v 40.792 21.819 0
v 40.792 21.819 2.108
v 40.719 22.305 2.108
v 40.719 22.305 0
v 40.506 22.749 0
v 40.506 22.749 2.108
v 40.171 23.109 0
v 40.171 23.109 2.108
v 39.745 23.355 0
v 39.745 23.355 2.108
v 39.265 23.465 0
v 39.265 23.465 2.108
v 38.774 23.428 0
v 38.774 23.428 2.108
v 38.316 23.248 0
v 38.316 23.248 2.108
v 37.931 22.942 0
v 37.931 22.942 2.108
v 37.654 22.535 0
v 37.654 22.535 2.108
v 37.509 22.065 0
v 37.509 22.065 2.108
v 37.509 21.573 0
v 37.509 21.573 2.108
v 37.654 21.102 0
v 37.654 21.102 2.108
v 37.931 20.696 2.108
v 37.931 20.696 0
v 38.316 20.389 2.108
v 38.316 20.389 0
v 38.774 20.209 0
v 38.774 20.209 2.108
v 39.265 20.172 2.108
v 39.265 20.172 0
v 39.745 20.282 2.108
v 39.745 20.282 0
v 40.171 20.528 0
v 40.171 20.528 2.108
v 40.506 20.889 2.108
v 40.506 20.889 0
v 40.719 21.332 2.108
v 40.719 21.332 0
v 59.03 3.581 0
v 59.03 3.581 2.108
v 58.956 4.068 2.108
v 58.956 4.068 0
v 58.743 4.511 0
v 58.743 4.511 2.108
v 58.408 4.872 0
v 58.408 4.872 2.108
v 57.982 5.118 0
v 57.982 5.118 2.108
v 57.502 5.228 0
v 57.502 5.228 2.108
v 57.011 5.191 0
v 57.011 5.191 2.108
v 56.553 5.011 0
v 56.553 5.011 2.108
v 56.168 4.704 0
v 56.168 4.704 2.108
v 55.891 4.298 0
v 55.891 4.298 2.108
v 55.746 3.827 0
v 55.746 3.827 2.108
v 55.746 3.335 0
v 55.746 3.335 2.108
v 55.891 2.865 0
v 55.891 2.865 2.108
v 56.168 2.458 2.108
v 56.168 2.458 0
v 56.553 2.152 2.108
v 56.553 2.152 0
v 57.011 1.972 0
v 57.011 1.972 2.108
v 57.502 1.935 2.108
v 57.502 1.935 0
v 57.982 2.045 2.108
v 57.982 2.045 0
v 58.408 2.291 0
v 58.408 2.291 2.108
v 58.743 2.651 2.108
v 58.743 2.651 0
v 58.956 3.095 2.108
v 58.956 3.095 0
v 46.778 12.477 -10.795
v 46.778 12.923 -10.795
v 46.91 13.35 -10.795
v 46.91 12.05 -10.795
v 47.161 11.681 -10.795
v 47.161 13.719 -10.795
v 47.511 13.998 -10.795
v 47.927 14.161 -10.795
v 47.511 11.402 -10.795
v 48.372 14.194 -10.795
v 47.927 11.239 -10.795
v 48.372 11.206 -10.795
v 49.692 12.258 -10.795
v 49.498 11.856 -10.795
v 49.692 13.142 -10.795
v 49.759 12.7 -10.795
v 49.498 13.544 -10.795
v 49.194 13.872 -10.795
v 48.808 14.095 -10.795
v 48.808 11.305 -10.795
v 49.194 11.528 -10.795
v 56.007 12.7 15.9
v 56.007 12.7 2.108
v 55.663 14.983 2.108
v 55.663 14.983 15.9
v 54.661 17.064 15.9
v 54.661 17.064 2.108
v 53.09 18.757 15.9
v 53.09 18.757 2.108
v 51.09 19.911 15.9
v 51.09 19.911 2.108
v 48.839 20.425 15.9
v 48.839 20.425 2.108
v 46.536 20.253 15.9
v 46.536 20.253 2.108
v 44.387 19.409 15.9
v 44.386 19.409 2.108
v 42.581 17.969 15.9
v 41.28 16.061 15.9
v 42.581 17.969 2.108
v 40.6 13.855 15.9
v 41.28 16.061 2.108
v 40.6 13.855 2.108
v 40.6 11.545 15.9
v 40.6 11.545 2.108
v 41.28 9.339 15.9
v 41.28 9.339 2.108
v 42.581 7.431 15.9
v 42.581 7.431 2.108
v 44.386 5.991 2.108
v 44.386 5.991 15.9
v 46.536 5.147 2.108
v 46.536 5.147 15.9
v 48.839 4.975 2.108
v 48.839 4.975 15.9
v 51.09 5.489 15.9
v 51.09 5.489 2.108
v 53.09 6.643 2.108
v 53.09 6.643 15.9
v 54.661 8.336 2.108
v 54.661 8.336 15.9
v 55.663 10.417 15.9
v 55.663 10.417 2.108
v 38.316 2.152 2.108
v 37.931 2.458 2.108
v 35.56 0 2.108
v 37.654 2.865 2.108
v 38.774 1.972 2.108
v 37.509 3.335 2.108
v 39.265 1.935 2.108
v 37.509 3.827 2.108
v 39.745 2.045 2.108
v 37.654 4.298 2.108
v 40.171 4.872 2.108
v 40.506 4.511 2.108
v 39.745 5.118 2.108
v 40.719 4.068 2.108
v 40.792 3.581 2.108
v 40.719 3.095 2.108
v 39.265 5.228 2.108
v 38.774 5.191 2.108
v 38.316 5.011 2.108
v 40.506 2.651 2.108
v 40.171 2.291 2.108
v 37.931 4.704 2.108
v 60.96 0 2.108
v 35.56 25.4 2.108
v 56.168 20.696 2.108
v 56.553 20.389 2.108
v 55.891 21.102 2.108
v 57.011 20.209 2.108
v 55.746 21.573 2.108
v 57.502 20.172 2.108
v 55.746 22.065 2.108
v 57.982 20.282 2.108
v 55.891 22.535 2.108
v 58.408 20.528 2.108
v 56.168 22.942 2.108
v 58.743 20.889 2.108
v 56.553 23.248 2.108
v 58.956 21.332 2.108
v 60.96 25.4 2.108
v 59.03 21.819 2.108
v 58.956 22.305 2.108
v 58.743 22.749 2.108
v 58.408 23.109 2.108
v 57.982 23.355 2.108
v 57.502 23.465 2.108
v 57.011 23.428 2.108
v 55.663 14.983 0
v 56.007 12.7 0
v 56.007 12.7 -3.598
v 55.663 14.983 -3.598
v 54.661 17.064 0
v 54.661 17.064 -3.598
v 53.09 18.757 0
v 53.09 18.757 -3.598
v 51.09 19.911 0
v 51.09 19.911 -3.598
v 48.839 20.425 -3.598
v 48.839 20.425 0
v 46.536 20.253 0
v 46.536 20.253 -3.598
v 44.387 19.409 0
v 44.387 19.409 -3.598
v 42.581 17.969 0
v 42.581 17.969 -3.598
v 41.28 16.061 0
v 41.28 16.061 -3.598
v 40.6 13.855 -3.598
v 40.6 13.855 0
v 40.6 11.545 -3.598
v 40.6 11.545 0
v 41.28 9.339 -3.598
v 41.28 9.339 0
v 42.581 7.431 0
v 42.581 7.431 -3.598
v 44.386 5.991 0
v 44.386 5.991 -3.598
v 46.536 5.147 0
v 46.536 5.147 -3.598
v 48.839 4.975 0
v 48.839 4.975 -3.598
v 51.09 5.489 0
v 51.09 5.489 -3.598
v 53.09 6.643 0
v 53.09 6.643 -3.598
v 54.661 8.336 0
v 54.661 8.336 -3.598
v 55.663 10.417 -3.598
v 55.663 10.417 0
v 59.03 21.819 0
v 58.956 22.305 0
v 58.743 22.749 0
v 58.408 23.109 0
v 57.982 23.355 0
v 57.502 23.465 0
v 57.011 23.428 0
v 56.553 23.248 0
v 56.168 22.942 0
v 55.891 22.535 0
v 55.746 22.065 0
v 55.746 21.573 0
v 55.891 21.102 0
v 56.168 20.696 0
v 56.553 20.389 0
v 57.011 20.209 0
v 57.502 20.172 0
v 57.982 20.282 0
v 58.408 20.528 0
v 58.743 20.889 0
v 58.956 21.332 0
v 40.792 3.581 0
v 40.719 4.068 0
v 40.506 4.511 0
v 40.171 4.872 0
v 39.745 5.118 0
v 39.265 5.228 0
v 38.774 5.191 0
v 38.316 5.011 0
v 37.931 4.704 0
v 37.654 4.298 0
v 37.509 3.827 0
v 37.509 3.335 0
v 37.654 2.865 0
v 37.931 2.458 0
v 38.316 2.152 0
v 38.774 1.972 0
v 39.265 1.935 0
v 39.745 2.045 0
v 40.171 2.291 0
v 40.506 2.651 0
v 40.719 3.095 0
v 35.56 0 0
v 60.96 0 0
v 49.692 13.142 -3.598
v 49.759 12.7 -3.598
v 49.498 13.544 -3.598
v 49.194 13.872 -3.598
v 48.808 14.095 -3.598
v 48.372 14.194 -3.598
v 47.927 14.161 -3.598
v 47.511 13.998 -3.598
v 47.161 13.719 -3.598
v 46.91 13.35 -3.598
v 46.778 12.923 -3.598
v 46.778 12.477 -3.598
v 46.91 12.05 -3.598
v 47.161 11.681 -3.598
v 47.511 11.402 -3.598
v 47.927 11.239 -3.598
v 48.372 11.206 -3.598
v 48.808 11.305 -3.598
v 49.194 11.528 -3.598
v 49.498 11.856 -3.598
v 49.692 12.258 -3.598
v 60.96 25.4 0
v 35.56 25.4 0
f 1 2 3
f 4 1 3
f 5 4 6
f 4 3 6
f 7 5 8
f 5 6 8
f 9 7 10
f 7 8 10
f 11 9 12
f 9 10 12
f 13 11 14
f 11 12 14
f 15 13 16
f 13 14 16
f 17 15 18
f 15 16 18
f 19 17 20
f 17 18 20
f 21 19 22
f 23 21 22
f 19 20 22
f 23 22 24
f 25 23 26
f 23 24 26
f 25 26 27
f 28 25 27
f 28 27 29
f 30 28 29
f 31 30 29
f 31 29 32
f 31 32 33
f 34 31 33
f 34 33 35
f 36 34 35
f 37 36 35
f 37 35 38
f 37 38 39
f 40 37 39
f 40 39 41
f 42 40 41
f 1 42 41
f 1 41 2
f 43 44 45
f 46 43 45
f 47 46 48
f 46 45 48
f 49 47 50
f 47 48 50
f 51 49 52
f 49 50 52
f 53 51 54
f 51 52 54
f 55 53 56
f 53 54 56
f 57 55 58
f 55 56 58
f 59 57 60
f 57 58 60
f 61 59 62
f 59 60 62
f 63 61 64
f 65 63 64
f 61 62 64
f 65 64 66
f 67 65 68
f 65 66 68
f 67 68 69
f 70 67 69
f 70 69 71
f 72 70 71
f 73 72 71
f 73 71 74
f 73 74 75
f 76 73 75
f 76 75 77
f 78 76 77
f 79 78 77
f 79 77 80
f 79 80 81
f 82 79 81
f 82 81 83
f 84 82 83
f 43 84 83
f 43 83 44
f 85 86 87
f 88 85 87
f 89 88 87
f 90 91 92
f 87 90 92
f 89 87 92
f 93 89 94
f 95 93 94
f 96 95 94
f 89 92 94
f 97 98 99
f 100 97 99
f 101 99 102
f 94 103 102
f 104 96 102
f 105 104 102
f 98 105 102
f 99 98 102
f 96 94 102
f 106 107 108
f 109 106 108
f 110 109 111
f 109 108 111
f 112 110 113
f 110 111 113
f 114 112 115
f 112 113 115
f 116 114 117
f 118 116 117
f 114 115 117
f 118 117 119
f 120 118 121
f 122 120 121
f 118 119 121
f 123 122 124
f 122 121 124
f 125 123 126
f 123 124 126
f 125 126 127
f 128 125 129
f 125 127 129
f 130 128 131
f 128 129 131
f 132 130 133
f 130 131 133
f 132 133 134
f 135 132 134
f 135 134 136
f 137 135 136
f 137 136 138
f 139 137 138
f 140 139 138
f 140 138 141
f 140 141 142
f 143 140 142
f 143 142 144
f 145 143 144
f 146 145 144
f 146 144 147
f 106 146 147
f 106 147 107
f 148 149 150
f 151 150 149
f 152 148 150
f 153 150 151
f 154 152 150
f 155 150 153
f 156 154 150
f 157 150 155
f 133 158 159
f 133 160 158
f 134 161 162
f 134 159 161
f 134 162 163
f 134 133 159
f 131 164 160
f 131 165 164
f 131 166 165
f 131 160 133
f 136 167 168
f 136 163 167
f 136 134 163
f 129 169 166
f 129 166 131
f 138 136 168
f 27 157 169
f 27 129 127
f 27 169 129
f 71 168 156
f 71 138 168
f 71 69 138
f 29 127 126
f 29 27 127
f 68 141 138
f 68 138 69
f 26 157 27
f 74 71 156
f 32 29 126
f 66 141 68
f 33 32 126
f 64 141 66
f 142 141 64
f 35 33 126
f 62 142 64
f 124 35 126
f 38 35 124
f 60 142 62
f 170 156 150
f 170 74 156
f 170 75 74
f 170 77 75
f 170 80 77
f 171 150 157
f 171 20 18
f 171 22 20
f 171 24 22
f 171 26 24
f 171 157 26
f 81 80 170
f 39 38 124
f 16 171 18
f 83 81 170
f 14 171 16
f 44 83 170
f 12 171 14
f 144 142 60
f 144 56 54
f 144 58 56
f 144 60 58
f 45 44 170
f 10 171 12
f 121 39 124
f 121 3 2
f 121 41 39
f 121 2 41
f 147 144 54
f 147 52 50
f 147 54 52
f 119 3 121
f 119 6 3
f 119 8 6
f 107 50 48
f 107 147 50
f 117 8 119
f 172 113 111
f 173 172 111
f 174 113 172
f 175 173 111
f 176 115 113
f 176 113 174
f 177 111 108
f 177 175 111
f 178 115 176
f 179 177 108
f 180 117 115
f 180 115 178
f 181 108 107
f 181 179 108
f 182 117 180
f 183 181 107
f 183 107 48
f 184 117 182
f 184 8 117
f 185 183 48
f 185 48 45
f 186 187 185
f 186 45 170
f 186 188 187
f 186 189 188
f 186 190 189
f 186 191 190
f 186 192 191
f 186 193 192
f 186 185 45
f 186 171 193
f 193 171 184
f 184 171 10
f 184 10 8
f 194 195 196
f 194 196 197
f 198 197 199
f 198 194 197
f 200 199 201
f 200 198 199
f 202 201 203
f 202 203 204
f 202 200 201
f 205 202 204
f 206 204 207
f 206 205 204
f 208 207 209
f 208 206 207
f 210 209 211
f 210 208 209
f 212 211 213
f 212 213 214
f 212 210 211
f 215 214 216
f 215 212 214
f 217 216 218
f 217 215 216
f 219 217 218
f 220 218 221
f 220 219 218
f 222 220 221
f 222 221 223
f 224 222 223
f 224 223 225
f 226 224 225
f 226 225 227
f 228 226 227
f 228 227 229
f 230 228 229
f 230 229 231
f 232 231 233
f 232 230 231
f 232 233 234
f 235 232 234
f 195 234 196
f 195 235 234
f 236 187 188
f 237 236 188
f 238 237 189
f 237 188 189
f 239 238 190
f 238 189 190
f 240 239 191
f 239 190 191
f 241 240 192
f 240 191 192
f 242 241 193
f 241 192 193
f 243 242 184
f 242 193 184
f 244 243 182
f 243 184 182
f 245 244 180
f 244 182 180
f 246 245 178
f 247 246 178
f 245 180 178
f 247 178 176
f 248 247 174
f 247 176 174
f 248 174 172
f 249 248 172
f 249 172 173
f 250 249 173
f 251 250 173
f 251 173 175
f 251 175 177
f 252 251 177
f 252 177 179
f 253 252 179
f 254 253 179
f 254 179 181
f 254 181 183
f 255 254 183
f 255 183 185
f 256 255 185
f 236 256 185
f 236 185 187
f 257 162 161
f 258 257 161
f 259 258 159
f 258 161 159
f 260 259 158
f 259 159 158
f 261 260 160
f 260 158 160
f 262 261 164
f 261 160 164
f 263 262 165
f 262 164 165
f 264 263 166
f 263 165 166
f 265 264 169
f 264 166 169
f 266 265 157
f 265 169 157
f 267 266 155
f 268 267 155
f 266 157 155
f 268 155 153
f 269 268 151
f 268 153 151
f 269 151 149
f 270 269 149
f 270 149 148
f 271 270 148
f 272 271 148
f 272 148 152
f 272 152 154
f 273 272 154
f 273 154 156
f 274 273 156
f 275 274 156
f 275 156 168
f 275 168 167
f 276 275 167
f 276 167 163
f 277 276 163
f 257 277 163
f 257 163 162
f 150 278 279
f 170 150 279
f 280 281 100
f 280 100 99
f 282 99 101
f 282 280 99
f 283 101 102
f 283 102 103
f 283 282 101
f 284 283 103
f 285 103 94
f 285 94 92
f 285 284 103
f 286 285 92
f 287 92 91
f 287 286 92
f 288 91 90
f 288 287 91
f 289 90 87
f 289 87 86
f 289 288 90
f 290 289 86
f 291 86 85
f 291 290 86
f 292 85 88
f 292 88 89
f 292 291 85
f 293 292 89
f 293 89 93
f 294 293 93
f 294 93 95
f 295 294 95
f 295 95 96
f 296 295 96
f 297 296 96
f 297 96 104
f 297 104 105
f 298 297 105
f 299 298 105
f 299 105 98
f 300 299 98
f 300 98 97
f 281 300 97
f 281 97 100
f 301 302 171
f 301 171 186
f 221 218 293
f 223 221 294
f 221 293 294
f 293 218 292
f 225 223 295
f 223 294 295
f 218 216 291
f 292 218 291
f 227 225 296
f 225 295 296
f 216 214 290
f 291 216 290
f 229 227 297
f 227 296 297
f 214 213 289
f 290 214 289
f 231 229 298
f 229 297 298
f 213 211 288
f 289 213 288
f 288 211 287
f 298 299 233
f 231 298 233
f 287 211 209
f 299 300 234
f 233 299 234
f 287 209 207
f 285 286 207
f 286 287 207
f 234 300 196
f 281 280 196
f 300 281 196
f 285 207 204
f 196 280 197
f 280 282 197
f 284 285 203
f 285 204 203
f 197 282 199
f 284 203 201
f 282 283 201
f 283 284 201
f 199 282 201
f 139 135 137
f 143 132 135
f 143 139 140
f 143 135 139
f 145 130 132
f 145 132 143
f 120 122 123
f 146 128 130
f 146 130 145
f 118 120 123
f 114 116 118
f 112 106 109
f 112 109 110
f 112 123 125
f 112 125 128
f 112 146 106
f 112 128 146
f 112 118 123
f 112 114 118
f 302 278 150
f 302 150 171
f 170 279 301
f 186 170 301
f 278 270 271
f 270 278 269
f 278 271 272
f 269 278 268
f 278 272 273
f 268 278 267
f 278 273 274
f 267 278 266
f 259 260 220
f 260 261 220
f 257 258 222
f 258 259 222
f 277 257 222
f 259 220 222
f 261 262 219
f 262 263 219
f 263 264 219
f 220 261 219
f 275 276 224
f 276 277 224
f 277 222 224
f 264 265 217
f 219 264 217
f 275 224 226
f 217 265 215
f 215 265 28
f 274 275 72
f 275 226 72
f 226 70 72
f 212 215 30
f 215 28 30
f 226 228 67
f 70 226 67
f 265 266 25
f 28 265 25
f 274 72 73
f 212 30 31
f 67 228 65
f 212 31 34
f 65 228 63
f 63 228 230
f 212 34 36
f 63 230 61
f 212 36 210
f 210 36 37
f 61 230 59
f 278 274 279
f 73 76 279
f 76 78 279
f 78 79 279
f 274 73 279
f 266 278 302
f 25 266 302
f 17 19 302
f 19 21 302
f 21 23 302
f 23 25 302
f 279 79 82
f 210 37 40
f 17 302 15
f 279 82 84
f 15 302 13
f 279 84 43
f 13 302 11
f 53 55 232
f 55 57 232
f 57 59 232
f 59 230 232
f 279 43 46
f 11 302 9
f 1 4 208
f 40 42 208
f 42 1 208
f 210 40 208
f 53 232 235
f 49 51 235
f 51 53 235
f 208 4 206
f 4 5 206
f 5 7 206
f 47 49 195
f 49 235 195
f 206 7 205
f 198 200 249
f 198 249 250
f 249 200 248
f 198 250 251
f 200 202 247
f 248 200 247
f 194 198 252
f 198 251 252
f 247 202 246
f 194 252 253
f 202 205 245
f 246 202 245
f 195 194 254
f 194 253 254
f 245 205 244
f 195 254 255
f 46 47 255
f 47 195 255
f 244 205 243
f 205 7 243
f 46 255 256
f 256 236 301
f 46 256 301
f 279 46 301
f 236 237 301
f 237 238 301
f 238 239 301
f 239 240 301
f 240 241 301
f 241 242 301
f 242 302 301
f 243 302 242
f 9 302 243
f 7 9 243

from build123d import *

# Parameters (mm, degrees)
SKETCH003_W  = 25.4
SKETCH003_H  = 25.4
PAD003_DEPTH = 2.1082
SKETCH004_R  = 1.651
POCKET_DEPTH = 2.1092
SKETCH005_R  = 7.747
PAD004_DEPTH = 15.9004
SKETCH006_R  = 7.747
PAD005_DEPTH = 3.598333
SKETCH007_R  = 1.4986
PAD006_DEPTH = 10.795


with BuildPart() as part:
    # Sketch003 → Pad003 (new body)
    with BuildSketch(Plane.XY):
        with Locations((12.7, 12.7)):
            Rectangle(SKETCH003_W, SKETCH003_H)
    extrude(amount=PAD003_DEPTH)

    # Sketch004 (on Face6 of Pad003) → Pocket (cut, through all)
    with BuildSketch(Plane.XY.offset(2.1082)):
        with Locations((3.5814, 21.8186)):
            Circle(SKETCH004_R)
        with Locations((21.8186, 21.8186)):
            Circle(SKETCH004_R)
        with Locations((21.8186, 3.5814)):
            Circle(SKETCH004_R)
        with Locations((3.5814, 3.5814)):
            Circle(SKETCH004_R)
    extrude(amount=-POCKET_DEPTH, mode=Mode.SUBTRACT)

    # Sketch005 → Pad004 (join)
    with BuildSketch(Plane.XY):
        with Locations((12.7, 12.7)):
            Circle(SKETCH005_R)
    extrude(amount=PAD004_DEPTH)

    # Sketch006 → Pad005 (join)
    with BuildSketch(Plane.XY):
        with Locations((12.7, 12.7)):
            Circle(SKETCH006_R)
    extrude(amount=-PAD005_DEPTH)

    # Sketch007 → Pad006 (join)
    with BuildSketch(Plane.XY):
        with Locations((12.7, 12.7)):
            Circle(SKETCH007_R)
    extrude(amount=-PAD006_DEPTH)


with BuildPart() as part_1:
    # Body001 placement: moved
    add(part.part.moved(Location((35.56, 0, 0))))


solid = part_1.part
